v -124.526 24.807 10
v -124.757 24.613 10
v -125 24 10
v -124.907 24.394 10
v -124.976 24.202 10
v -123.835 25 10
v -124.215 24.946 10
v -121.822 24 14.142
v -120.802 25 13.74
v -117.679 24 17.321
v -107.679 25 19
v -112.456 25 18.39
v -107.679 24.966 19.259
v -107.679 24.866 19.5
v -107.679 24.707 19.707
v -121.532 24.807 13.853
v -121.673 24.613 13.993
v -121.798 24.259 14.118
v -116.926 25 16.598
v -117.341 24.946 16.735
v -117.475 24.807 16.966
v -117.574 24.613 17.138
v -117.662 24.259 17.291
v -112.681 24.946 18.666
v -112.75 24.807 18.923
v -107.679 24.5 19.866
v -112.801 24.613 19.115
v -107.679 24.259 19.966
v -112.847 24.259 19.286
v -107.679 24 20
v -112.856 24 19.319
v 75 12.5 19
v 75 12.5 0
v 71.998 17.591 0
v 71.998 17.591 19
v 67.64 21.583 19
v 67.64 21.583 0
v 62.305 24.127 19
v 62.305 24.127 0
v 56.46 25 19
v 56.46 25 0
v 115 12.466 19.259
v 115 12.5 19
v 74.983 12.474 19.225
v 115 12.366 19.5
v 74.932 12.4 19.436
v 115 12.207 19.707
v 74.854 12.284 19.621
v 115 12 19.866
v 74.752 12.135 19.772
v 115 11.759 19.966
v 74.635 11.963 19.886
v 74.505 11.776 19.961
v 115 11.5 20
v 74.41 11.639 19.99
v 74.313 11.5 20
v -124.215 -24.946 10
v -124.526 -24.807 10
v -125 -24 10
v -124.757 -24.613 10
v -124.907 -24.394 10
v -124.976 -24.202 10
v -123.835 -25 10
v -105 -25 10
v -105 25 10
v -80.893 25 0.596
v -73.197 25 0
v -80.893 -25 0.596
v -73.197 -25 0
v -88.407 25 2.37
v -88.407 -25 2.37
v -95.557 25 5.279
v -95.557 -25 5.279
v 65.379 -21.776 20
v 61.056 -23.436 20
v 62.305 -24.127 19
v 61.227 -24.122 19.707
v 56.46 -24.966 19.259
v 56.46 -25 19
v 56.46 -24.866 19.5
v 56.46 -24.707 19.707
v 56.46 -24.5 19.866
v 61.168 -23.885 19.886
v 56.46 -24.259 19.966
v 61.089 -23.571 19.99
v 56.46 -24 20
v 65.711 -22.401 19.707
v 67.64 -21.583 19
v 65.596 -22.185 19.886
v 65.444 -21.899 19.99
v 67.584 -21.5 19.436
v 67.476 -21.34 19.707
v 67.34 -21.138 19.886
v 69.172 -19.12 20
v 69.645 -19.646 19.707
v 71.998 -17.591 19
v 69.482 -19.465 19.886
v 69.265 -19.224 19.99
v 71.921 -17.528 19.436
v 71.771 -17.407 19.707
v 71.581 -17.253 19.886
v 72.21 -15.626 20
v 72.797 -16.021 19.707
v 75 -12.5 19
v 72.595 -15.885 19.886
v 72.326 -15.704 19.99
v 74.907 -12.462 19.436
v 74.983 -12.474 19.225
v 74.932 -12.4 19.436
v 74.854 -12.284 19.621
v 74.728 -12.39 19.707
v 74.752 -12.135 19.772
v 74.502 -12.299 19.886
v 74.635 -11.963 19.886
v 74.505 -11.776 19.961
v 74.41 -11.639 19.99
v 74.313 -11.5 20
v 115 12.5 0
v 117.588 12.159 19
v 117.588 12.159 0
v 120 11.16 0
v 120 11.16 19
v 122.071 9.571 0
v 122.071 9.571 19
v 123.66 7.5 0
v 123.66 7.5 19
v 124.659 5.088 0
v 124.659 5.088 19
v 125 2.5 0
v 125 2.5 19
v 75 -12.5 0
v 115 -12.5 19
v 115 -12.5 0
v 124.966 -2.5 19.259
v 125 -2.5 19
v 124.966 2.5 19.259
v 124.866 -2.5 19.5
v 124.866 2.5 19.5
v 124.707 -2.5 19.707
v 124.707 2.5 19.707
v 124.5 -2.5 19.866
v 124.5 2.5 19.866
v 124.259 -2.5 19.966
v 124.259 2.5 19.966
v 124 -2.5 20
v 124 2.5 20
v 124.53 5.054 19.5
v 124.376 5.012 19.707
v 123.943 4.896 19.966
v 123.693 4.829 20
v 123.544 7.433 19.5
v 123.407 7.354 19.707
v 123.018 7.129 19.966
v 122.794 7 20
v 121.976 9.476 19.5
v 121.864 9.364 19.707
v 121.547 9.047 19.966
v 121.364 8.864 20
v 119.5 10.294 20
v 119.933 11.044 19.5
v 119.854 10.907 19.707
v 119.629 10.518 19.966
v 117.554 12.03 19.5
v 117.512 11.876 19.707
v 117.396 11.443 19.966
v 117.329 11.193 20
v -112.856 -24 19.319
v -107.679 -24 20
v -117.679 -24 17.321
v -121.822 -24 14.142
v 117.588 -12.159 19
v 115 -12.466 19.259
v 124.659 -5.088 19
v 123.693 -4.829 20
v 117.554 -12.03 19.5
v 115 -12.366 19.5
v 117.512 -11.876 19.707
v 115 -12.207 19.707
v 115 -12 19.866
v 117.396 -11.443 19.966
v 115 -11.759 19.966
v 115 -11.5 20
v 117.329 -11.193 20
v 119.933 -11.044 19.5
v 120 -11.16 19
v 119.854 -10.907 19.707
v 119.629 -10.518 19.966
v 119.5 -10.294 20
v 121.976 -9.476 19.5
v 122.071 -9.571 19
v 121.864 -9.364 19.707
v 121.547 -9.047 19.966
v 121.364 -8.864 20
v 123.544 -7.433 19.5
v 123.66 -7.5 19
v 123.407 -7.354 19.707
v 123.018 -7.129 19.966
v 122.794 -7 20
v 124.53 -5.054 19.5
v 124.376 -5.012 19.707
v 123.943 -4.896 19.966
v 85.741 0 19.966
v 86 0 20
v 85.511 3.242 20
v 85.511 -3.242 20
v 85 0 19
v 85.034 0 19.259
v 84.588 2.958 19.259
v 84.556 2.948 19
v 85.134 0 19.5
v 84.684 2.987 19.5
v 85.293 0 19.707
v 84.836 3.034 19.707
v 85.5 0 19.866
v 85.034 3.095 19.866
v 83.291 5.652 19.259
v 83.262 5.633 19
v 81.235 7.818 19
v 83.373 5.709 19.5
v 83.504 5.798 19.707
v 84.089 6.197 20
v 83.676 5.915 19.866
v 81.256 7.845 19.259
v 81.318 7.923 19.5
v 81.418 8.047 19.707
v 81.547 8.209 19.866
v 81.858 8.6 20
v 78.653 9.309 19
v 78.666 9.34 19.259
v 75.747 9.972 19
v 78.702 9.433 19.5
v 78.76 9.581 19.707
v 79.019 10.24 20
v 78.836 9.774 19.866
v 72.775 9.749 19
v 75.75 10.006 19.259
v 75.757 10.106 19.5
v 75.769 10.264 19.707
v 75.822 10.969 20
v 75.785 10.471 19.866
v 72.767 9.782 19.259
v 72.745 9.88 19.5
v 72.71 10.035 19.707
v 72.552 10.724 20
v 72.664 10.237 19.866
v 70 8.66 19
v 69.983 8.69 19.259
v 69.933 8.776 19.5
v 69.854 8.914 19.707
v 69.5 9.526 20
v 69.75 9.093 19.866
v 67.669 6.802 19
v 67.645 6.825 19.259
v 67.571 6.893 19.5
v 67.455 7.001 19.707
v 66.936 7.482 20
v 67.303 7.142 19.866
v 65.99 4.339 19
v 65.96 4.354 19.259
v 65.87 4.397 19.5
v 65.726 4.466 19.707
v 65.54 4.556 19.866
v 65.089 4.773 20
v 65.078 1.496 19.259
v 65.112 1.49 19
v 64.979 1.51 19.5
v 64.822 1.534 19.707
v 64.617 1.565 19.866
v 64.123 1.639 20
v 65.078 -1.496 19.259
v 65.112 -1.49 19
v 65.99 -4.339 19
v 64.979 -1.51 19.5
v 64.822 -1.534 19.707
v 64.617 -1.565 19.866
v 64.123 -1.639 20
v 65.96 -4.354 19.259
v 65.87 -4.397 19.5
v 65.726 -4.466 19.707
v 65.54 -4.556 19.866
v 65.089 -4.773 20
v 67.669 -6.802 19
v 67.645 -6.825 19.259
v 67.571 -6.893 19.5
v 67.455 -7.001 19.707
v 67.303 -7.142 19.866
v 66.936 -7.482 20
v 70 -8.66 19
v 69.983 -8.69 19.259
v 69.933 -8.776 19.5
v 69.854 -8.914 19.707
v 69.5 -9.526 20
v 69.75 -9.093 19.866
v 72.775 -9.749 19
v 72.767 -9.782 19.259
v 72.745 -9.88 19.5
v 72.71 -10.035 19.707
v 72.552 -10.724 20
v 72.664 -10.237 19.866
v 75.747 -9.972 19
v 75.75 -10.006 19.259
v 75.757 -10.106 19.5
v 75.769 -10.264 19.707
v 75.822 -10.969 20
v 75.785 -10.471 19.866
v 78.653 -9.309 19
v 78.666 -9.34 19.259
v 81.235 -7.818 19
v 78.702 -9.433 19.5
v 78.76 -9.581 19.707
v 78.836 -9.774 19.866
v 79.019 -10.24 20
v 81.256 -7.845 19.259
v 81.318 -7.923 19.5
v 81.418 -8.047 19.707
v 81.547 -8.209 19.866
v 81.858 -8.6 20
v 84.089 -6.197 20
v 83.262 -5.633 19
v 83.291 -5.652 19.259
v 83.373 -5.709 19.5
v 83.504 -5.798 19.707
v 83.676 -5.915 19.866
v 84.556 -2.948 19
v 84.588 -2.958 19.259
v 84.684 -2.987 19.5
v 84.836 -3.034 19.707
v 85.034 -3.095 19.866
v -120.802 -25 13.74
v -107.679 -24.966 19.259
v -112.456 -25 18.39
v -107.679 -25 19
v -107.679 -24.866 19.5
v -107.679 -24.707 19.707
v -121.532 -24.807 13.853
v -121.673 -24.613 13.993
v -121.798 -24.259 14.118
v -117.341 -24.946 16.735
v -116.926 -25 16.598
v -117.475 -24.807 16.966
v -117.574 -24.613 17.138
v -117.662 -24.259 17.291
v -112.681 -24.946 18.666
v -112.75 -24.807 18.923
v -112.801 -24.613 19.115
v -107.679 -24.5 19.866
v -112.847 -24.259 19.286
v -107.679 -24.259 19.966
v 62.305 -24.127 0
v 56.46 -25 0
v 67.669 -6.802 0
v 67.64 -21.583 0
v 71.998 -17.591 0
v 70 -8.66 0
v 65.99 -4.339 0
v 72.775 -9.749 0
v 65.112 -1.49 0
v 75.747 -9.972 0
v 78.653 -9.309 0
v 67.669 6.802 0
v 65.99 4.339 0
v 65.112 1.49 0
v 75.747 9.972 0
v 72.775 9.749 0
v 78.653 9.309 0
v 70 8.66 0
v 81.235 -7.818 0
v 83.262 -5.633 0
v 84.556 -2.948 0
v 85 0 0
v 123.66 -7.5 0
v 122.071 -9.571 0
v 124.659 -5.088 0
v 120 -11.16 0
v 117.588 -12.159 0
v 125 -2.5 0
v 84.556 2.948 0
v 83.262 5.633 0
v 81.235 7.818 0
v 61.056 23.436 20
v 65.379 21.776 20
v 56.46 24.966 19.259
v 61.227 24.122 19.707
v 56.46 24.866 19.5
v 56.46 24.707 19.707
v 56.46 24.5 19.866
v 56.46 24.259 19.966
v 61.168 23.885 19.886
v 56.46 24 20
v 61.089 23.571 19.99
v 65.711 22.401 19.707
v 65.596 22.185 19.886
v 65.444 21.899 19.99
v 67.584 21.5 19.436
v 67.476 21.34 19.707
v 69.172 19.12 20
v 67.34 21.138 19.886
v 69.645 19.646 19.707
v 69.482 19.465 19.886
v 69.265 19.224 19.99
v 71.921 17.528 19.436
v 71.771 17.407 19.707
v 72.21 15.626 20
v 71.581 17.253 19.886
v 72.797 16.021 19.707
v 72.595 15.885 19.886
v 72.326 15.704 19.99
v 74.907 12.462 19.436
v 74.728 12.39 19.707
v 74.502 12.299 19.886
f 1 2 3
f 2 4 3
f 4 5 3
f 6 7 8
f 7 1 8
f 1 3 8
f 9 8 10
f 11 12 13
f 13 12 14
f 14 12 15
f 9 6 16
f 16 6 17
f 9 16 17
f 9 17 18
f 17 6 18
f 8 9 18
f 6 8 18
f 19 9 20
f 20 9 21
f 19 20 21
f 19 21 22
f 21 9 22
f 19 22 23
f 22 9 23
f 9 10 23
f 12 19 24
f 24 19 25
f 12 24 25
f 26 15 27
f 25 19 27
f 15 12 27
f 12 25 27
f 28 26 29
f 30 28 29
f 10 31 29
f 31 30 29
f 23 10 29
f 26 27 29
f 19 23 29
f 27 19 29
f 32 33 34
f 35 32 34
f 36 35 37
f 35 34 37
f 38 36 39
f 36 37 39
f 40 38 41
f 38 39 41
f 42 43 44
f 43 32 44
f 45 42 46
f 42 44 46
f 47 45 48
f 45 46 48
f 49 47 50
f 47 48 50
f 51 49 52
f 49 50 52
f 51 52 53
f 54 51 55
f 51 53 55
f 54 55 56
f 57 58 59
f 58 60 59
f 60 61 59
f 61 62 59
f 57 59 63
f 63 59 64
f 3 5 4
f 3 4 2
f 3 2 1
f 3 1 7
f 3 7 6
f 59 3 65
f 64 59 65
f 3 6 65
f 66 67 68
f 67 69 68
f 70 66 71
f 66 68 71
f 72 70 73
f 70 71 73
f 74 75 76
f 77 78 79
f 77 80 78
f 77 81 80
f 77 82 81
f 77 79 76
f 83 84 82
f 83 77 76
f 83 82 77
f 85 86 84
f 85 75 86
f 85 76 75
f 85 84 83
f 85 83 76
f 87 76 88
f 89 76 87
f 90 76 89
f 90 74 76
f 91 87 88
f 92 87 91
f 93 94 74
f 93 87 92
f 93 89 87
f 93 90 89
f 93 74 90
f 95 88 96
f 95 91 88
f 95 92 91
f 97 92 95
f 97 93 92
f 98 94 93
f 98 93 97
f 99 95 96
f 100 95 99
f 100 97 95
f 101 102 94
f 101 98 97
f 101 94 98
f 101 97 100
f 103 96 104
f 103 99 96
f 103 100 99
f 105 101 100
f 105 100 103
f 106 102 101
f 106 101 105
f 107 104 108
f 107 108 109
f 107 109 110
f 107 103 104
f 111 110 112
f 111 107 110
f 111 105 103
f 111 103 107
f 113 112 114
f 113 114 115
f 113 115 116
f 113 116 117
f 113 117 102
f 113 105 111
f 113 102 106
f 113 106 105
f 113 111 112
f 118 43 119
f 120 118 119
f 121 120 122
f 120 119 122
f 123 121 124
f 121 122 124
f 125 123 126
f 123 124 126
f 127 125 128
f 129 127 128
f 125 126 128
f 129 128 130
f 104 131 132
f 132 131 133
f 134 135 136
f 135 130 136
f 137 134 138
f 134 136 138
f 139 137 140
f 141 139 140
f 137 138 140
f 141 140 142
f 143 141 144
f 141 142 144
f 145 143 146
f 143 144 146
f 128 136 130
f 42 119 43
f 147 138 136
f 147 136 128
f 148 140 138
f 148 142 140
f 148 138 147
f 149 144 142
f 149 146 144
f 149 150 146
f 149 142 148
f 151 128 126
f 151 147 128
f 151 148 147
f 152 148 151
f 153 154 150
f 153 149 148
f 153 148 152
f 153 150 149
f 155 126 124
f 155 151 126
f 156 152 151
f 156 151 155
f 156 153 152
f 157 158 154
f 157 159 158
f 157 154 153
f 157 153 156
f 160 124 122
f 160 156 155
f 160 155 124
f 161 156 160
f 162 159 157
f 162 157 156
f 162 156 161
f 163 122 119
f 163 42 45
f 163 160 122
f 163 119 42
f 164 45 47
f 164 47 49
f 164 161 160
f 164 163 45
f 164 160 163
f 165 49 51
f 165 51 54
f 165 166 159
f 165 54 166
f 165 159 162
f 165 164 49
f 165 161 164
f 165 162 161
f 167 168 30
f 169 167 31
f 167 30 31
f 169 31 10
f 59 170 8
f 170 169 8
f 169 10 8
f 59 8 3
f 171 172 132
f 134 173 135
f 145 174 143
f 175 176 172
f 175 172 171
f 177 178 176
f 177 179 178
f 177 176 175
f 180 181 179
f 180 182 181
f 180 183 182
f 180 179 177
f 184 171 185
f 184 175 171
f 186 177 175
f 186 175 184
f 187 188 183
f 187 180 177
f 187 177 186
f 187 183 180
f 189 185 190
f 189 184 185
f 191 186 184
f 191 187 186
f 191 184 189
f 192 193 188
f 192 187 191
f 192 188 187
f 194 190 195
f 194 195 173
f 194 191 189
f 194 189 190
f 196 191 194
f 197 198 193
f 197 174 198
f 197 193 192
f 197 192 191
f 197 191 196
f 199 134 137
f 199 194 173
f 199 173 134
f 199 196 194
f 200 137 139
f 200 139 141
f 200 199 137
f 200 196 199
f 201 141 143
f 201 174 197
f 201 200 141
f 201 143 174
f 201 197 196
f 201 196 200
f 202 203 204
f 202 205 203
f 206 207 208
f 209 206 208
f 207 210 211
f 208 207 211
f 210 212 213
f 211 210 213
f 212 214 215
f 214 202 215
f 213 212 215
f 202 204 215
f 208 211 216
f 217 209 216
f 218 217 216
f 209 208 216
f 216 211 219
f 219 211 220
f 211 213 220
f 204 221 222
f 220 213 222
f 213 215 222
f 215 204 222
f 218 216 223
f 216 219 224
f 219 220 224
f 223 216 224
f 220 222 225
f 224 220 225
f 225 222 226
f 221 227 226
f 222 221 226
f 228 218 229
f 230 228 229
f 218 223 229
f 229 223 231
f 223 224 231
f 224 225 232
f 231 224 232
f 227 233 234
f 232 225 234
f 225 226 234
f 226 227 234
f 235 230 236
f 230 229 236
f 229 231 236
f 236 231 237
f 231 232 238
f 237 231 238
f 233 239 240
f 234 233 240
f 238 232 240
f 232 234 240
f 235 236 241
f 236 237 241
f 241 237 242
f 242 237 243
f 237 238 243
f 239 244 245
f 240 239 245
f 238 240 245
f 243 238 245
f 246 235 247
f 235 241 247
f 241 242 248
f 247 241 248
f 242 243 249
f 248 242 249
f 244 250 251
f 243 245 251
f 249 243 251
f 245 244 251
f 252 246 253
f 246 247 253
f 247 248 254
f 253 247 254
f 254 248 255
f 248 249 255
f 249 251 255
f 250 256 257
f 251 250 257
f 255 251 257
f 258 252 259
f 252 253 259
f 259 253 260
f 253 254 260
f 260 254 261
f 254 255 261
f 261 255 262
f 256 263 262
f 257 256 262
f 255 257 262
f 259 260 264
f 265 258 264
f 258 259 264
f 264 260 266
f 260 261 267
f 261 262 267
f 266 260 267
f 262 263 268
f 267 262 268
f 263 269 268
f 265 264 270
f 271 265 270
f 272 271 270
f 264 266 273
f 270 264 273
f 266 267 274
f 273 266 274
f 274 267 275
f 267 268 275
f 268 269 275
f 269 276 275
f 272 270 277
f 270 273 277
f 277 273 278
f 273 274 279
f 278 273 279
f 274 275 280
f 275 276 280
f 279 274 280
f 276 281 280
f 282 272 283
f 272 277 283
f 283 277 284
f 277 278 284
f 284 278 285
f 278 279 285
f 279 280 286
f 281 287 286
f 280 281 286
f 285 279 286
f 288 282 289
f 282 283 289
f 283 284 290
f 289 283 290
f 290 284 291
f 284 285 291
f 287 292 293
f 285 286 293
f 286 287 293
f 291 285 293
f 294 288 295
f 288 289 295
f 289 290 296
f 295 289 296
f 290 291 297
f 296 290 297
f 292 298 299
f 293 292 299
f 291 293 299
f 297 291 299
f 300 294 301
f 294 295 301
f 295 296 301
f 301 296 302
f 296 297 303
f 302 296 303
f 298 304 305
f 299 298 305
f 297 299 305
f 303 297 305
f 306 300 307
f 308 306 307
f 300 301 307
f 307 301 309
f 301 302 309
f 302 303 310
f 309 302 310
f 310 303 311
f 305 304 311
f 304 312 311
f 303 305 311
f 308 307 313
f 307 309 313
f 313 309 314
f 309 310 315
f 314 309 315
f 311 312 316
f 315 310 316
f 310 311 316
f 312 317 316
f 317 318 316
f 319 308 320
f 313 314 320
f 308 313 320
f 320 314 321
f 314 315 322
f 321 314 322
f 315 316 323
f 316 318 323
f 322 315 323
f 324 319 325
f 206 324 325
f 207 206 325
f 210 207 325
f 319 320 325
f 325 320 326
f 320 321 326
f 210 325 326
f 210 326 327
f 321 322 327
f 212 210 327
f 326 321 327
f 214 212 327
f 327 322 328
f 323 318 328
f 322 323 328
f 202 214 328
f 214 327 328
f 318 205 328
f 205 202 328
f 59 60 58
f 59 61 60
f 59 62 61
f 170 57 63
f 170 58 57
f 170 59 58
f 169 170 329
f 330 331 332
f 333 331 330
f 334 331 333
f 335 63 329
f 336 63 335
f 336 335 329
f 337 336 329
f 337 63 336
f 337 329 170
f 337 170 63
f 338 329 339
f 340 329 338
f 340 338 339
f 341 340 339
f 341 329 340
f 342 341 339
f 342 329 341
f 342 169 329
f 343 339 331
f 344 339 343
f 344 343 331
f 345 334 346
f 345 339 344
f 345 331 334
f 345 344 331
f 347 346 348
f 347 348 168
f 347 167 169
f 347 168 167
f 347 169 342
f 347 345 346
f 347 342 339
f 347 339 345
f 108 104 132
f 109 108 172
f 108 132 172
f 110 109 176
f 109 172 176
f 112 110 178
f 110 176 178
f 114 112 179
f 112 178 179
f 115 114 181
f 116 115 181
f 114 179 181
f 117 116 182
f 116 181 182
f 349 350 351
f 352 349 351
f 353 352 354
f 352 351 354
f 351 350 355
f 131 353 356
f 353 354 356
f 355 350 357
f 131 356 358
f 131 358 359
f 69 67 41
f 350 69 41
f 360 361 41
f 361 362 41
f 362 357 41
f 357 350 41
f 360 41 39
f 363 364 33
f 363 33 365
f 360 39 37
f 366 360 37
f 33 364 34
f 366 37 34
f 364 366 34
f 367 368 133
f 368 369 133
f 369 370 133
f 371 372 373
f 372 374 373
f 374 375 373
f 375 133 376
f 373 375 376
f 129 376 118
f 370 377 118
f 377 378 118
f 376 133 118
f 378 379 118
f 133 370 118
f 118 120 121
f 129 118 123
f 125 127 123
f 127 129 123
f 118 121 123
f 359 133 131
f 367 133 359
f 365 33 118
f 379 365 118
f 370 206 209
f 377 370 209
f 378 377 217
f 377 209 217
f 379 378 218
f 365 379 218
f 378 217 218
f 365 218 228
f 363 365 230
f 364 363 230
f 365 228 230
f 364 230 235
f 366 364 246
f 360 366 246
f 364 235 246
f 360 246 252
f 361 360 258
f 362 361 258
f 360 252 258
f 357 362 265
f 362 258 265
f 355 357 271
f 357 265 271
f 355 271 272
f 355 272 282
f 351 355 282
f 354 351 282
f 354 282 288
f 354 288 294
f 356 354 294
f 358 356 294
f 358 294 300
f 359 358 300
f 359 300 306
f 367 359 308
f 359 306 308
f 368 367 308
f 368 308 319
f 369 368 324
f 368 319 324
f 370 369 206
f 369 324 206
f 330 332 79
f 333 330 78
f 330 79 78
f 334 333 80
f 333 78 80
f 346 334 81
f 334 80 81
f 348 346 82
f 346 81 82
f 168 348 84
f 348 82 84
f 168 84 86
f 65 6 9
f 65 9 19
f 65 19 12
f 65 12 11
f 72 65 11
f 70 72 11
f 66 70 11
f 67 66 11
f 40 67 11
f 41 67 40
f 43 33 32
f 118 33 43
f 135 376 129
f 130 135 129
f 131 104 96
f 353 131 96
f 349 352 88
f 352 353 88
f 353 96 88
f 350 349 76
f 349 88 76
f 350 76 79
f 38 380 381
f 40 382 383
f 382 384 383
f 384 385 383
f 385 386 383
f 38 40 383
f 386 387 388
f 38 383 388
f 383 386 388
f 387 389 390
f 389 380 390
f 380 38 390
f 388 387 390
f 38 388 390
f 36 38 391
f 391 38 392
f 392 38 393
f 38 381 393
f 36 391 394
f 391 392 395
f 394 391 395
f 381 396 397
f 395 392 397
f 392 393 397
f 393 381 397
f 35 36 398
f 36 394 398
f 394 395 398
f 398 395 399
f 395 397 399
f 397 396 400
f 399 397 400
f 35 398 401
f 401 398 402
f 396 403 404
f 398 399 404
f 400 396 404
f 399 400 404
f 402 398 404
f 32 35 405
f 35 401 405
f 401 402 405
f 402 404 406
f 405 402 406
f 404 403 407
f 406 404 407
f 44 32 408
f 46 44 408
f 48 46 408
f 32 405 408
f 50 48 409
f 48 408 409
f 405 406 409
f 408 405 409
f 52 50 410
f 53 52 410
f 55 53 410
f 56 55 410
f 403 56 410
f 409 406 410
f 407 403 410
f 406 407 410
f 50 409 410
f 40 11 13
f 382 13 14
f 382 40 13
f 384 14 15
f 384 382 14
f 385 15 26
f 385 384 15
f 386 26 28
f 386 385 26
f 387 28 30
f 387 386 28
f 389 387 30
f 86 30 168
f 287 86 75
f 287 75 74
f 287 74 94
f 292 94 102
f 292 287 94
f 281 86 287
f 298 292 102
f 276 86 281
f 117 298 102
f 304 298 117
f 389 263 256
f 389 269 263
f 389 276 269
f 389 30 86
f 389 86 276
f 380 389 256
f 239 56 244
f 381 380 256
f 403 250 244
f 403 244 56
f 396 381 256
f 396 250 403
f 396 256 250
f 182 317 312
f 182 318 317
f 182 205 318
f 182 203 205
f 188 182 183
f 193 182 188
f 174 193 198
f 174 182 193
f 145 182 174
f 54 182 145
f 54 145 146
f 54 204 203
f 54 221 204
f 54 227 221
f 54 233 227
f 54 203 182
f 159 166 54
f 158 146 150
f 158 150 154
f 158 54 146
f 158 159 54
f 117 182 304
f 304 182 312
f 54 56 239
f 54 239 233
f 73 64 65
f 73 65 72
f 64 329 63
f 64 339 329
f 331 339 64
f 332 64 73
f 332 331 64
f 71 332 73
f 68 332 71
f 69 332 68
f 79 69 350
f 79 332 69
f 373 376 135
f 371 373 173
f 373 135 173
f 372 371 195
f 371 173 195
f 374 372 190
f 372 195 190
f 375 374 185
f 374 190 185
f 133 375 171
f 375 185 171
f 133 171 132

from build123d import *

# Parameters (mm, degrees)
SKETCH1_W           = 250
SKETCH1_H           = 25
BOSS_EXTRUDE3_DEPTH = 20
SKETCH4_R           = 10
CUT_EXTRUDE3_DEPTH  = 20
SKETCH6_W           = 200
SKETCH6_H           = 20
BOSS_EXTRUDE4_DEPTH = 12.5
SKETCH7_W           = 200
SKETCH7_H           = 20
BOSS_EXTRUDE5_DEPTH = 12.5
CUT_EXTRUDE8_DEPTH  = 137.106575888
FILLET10_R          = 20
FILLET11_R          = 20
FILLET12_R          = 10
FILLET13_R          = 50
FILLET15_R          = 1


with BuildPart() as part:
    # Sketch1 → Boss-Extrude3 (new body)
    with BuildSketch(Plane.XY):
        Rectangle(SKETCH1_W, SKETCH1_H)
    extrude(amount=BOSS_EXTRUDE3_DEPTH)

    # Sketch4 → Cut-Extrude3 (cut)
    with BuildSketch(Plane.XY.offset(20)):
        with Locations((75, 0)):
            Circle(SKETCH4_R)
    extrude(amount=-CUT_EXTRUDE3_DEPTH, mode=Mode.SUBTRACT)

    # Sketch6 → Boss-Extrude4 (add)
    with BuildSketch(Plane(origin=(0, 12.5, 0), x_dir=(1, 0, 0), z_dir=(0, 1, 0))):
        with Locations((-25, -10)):
            Rectangle(SKETCH6_W, SKETCH6_H)
    extrude(amount=BOSS_EXTRUDE4_DEPTH)

    # Sketch7 → Boss-Extrude5 (add)
    with BuildSketch(Plane.XZ.offset(12.5)):
        with Locations((-25, 10)):
            Rectangle(SKETCH7_W, SKETCH7_H)
    extrude(amount=BOSS_EXTRUDE5_DEPTH)

    # Sketch8 → Cut-Extrude8 (cut, through all)
    with BuildSketch(Plane(origin=(0, 25, 0), x_dir=(1, 0, 0), z_dir=(0, 1, 0))):
        Polygon((-85, 0), (-125, 0), (-125, -10), (-105, -10), align=None)
    extrude(amount=-CUT_EXTRUDE8_DEPTH, mode=Mode.SUBTRACT)

    # Fillet10
    # the kernel refuses this fillet: 20 mm, written as the material it takes off along each edge
    with BuildSketch(Plane(origin=(-125, 68.301270189, 20), x_dir=(1, 0, 0), z_dir=(0, -1, 0))) as fillet10_piece_1:
        with BuildLine():
            CenterArc((17.320508076, -20), FILLET10_R, 90, 60)
            Line((0, -10), (-0.346410162, -9.8))
            ThreePointArc((-0.346410162, -9.8), (-0.4, -5), (-0.4, 0))
            Line((-0.4, 0), (0, 0.4))
            Line((0, 0.4), (17.320508076, 0.4))
            Line((17.320508076, 0.4), (17.320508076, 0))
        make_face()
    extrude(amount=136.602540378, mode=Mode.SUBTRACT)

    # Fillet11
    # the kernel refuses this fillet: 20 mm, written as the material it takes off along each edge
    with BuildSketch(Plane(origin=(75, -25, 66.351240544), x_dir=(-1, 0, 0), z_dir=(0, 0, -1))) as fillet11_piece_1:
        with BuildLine():
            CenterArc((18.540496218, 20), FILLET11_R, 202.024312837, 67.975687163)
            Line((0, 12.5), (-0.370809924, 12.35))
            ThreePointArc((-0.370809924, 12.35), (-0.4, 6.25), (-0.4, 0))
            Line((-0.4, 0), (0, -0.4))
            Line((0, -0.4), (18.540496218, -0.4))
            Line((18.540496218, -0.4), (18.540496218, 0))
        make_face()
    extrude(amount=112.702481089, mode=Mode.SUBTRACT)
    with BuildSketch(Plane(origin=(75, 25, -46.351240544), x_dir=(0, -1, 0), z_dir=(0, 0, 1))) as fillet11_piece_2:
        with BuildLine():
            CenterArc((20, -18.540496218), FILLET11_R, 112.024312837, 67.975687163)
            Line((0, -18.540496218), (-0.4, -18.540496218))
            Line((-0.4, -18.540496218), (-0.4, 0))
            Line((-0.4, 0), (0, 0.4))
            ThreePointArc((0, 0.4), (6.25, 0.4), (12.35, 0.370809924))
            Line((12.35, 0.370809924), (12.5, 0))
        make_face()
    extrude(amount=112.702481089, mode=Mode.SUBTRACT)

    # Fillet12
    fillet12_edges = [part.edges().sort_by_distance(p)[0] for p in [
        (125, -12.5, 10),
        (125, 12.5, 10),
    ]]
    fillet(fillet12_edges, radius=FILLET12_R)

    # Fillet13
    fillet13_edges = [part.edges().sort_by_distance(p)[0] for p in [
        (-85, 0, 0),
    ]]
    fillet(fillet13_edges, radius=FILLET13_R)

    # Fillet15
    fillet15_edges = [part.edges().sort_by_distance(p)[0] for p in [
        (65, 0, 20),
        (95, -12.5, 20),
        (-25.609994071, 25, 20),
        (-117.679491924, -25, 17.320508076),
        (-117.679491924, 25, 17.320508076),
        (-25.609994071, -25, 20),
        (67.63984367, 21.583123952, 20),
        (67.63984367, -21.583123952, 20),
        (95, 12.5, 20),
        (125, 0, 20),
        (122.071067812, -9.571067812, 20),
        (122.071067812, 9.571067812, 20),
    ]]
    fillet(fillet15_edges, radius=FILLET15_R)


solid = part.part
